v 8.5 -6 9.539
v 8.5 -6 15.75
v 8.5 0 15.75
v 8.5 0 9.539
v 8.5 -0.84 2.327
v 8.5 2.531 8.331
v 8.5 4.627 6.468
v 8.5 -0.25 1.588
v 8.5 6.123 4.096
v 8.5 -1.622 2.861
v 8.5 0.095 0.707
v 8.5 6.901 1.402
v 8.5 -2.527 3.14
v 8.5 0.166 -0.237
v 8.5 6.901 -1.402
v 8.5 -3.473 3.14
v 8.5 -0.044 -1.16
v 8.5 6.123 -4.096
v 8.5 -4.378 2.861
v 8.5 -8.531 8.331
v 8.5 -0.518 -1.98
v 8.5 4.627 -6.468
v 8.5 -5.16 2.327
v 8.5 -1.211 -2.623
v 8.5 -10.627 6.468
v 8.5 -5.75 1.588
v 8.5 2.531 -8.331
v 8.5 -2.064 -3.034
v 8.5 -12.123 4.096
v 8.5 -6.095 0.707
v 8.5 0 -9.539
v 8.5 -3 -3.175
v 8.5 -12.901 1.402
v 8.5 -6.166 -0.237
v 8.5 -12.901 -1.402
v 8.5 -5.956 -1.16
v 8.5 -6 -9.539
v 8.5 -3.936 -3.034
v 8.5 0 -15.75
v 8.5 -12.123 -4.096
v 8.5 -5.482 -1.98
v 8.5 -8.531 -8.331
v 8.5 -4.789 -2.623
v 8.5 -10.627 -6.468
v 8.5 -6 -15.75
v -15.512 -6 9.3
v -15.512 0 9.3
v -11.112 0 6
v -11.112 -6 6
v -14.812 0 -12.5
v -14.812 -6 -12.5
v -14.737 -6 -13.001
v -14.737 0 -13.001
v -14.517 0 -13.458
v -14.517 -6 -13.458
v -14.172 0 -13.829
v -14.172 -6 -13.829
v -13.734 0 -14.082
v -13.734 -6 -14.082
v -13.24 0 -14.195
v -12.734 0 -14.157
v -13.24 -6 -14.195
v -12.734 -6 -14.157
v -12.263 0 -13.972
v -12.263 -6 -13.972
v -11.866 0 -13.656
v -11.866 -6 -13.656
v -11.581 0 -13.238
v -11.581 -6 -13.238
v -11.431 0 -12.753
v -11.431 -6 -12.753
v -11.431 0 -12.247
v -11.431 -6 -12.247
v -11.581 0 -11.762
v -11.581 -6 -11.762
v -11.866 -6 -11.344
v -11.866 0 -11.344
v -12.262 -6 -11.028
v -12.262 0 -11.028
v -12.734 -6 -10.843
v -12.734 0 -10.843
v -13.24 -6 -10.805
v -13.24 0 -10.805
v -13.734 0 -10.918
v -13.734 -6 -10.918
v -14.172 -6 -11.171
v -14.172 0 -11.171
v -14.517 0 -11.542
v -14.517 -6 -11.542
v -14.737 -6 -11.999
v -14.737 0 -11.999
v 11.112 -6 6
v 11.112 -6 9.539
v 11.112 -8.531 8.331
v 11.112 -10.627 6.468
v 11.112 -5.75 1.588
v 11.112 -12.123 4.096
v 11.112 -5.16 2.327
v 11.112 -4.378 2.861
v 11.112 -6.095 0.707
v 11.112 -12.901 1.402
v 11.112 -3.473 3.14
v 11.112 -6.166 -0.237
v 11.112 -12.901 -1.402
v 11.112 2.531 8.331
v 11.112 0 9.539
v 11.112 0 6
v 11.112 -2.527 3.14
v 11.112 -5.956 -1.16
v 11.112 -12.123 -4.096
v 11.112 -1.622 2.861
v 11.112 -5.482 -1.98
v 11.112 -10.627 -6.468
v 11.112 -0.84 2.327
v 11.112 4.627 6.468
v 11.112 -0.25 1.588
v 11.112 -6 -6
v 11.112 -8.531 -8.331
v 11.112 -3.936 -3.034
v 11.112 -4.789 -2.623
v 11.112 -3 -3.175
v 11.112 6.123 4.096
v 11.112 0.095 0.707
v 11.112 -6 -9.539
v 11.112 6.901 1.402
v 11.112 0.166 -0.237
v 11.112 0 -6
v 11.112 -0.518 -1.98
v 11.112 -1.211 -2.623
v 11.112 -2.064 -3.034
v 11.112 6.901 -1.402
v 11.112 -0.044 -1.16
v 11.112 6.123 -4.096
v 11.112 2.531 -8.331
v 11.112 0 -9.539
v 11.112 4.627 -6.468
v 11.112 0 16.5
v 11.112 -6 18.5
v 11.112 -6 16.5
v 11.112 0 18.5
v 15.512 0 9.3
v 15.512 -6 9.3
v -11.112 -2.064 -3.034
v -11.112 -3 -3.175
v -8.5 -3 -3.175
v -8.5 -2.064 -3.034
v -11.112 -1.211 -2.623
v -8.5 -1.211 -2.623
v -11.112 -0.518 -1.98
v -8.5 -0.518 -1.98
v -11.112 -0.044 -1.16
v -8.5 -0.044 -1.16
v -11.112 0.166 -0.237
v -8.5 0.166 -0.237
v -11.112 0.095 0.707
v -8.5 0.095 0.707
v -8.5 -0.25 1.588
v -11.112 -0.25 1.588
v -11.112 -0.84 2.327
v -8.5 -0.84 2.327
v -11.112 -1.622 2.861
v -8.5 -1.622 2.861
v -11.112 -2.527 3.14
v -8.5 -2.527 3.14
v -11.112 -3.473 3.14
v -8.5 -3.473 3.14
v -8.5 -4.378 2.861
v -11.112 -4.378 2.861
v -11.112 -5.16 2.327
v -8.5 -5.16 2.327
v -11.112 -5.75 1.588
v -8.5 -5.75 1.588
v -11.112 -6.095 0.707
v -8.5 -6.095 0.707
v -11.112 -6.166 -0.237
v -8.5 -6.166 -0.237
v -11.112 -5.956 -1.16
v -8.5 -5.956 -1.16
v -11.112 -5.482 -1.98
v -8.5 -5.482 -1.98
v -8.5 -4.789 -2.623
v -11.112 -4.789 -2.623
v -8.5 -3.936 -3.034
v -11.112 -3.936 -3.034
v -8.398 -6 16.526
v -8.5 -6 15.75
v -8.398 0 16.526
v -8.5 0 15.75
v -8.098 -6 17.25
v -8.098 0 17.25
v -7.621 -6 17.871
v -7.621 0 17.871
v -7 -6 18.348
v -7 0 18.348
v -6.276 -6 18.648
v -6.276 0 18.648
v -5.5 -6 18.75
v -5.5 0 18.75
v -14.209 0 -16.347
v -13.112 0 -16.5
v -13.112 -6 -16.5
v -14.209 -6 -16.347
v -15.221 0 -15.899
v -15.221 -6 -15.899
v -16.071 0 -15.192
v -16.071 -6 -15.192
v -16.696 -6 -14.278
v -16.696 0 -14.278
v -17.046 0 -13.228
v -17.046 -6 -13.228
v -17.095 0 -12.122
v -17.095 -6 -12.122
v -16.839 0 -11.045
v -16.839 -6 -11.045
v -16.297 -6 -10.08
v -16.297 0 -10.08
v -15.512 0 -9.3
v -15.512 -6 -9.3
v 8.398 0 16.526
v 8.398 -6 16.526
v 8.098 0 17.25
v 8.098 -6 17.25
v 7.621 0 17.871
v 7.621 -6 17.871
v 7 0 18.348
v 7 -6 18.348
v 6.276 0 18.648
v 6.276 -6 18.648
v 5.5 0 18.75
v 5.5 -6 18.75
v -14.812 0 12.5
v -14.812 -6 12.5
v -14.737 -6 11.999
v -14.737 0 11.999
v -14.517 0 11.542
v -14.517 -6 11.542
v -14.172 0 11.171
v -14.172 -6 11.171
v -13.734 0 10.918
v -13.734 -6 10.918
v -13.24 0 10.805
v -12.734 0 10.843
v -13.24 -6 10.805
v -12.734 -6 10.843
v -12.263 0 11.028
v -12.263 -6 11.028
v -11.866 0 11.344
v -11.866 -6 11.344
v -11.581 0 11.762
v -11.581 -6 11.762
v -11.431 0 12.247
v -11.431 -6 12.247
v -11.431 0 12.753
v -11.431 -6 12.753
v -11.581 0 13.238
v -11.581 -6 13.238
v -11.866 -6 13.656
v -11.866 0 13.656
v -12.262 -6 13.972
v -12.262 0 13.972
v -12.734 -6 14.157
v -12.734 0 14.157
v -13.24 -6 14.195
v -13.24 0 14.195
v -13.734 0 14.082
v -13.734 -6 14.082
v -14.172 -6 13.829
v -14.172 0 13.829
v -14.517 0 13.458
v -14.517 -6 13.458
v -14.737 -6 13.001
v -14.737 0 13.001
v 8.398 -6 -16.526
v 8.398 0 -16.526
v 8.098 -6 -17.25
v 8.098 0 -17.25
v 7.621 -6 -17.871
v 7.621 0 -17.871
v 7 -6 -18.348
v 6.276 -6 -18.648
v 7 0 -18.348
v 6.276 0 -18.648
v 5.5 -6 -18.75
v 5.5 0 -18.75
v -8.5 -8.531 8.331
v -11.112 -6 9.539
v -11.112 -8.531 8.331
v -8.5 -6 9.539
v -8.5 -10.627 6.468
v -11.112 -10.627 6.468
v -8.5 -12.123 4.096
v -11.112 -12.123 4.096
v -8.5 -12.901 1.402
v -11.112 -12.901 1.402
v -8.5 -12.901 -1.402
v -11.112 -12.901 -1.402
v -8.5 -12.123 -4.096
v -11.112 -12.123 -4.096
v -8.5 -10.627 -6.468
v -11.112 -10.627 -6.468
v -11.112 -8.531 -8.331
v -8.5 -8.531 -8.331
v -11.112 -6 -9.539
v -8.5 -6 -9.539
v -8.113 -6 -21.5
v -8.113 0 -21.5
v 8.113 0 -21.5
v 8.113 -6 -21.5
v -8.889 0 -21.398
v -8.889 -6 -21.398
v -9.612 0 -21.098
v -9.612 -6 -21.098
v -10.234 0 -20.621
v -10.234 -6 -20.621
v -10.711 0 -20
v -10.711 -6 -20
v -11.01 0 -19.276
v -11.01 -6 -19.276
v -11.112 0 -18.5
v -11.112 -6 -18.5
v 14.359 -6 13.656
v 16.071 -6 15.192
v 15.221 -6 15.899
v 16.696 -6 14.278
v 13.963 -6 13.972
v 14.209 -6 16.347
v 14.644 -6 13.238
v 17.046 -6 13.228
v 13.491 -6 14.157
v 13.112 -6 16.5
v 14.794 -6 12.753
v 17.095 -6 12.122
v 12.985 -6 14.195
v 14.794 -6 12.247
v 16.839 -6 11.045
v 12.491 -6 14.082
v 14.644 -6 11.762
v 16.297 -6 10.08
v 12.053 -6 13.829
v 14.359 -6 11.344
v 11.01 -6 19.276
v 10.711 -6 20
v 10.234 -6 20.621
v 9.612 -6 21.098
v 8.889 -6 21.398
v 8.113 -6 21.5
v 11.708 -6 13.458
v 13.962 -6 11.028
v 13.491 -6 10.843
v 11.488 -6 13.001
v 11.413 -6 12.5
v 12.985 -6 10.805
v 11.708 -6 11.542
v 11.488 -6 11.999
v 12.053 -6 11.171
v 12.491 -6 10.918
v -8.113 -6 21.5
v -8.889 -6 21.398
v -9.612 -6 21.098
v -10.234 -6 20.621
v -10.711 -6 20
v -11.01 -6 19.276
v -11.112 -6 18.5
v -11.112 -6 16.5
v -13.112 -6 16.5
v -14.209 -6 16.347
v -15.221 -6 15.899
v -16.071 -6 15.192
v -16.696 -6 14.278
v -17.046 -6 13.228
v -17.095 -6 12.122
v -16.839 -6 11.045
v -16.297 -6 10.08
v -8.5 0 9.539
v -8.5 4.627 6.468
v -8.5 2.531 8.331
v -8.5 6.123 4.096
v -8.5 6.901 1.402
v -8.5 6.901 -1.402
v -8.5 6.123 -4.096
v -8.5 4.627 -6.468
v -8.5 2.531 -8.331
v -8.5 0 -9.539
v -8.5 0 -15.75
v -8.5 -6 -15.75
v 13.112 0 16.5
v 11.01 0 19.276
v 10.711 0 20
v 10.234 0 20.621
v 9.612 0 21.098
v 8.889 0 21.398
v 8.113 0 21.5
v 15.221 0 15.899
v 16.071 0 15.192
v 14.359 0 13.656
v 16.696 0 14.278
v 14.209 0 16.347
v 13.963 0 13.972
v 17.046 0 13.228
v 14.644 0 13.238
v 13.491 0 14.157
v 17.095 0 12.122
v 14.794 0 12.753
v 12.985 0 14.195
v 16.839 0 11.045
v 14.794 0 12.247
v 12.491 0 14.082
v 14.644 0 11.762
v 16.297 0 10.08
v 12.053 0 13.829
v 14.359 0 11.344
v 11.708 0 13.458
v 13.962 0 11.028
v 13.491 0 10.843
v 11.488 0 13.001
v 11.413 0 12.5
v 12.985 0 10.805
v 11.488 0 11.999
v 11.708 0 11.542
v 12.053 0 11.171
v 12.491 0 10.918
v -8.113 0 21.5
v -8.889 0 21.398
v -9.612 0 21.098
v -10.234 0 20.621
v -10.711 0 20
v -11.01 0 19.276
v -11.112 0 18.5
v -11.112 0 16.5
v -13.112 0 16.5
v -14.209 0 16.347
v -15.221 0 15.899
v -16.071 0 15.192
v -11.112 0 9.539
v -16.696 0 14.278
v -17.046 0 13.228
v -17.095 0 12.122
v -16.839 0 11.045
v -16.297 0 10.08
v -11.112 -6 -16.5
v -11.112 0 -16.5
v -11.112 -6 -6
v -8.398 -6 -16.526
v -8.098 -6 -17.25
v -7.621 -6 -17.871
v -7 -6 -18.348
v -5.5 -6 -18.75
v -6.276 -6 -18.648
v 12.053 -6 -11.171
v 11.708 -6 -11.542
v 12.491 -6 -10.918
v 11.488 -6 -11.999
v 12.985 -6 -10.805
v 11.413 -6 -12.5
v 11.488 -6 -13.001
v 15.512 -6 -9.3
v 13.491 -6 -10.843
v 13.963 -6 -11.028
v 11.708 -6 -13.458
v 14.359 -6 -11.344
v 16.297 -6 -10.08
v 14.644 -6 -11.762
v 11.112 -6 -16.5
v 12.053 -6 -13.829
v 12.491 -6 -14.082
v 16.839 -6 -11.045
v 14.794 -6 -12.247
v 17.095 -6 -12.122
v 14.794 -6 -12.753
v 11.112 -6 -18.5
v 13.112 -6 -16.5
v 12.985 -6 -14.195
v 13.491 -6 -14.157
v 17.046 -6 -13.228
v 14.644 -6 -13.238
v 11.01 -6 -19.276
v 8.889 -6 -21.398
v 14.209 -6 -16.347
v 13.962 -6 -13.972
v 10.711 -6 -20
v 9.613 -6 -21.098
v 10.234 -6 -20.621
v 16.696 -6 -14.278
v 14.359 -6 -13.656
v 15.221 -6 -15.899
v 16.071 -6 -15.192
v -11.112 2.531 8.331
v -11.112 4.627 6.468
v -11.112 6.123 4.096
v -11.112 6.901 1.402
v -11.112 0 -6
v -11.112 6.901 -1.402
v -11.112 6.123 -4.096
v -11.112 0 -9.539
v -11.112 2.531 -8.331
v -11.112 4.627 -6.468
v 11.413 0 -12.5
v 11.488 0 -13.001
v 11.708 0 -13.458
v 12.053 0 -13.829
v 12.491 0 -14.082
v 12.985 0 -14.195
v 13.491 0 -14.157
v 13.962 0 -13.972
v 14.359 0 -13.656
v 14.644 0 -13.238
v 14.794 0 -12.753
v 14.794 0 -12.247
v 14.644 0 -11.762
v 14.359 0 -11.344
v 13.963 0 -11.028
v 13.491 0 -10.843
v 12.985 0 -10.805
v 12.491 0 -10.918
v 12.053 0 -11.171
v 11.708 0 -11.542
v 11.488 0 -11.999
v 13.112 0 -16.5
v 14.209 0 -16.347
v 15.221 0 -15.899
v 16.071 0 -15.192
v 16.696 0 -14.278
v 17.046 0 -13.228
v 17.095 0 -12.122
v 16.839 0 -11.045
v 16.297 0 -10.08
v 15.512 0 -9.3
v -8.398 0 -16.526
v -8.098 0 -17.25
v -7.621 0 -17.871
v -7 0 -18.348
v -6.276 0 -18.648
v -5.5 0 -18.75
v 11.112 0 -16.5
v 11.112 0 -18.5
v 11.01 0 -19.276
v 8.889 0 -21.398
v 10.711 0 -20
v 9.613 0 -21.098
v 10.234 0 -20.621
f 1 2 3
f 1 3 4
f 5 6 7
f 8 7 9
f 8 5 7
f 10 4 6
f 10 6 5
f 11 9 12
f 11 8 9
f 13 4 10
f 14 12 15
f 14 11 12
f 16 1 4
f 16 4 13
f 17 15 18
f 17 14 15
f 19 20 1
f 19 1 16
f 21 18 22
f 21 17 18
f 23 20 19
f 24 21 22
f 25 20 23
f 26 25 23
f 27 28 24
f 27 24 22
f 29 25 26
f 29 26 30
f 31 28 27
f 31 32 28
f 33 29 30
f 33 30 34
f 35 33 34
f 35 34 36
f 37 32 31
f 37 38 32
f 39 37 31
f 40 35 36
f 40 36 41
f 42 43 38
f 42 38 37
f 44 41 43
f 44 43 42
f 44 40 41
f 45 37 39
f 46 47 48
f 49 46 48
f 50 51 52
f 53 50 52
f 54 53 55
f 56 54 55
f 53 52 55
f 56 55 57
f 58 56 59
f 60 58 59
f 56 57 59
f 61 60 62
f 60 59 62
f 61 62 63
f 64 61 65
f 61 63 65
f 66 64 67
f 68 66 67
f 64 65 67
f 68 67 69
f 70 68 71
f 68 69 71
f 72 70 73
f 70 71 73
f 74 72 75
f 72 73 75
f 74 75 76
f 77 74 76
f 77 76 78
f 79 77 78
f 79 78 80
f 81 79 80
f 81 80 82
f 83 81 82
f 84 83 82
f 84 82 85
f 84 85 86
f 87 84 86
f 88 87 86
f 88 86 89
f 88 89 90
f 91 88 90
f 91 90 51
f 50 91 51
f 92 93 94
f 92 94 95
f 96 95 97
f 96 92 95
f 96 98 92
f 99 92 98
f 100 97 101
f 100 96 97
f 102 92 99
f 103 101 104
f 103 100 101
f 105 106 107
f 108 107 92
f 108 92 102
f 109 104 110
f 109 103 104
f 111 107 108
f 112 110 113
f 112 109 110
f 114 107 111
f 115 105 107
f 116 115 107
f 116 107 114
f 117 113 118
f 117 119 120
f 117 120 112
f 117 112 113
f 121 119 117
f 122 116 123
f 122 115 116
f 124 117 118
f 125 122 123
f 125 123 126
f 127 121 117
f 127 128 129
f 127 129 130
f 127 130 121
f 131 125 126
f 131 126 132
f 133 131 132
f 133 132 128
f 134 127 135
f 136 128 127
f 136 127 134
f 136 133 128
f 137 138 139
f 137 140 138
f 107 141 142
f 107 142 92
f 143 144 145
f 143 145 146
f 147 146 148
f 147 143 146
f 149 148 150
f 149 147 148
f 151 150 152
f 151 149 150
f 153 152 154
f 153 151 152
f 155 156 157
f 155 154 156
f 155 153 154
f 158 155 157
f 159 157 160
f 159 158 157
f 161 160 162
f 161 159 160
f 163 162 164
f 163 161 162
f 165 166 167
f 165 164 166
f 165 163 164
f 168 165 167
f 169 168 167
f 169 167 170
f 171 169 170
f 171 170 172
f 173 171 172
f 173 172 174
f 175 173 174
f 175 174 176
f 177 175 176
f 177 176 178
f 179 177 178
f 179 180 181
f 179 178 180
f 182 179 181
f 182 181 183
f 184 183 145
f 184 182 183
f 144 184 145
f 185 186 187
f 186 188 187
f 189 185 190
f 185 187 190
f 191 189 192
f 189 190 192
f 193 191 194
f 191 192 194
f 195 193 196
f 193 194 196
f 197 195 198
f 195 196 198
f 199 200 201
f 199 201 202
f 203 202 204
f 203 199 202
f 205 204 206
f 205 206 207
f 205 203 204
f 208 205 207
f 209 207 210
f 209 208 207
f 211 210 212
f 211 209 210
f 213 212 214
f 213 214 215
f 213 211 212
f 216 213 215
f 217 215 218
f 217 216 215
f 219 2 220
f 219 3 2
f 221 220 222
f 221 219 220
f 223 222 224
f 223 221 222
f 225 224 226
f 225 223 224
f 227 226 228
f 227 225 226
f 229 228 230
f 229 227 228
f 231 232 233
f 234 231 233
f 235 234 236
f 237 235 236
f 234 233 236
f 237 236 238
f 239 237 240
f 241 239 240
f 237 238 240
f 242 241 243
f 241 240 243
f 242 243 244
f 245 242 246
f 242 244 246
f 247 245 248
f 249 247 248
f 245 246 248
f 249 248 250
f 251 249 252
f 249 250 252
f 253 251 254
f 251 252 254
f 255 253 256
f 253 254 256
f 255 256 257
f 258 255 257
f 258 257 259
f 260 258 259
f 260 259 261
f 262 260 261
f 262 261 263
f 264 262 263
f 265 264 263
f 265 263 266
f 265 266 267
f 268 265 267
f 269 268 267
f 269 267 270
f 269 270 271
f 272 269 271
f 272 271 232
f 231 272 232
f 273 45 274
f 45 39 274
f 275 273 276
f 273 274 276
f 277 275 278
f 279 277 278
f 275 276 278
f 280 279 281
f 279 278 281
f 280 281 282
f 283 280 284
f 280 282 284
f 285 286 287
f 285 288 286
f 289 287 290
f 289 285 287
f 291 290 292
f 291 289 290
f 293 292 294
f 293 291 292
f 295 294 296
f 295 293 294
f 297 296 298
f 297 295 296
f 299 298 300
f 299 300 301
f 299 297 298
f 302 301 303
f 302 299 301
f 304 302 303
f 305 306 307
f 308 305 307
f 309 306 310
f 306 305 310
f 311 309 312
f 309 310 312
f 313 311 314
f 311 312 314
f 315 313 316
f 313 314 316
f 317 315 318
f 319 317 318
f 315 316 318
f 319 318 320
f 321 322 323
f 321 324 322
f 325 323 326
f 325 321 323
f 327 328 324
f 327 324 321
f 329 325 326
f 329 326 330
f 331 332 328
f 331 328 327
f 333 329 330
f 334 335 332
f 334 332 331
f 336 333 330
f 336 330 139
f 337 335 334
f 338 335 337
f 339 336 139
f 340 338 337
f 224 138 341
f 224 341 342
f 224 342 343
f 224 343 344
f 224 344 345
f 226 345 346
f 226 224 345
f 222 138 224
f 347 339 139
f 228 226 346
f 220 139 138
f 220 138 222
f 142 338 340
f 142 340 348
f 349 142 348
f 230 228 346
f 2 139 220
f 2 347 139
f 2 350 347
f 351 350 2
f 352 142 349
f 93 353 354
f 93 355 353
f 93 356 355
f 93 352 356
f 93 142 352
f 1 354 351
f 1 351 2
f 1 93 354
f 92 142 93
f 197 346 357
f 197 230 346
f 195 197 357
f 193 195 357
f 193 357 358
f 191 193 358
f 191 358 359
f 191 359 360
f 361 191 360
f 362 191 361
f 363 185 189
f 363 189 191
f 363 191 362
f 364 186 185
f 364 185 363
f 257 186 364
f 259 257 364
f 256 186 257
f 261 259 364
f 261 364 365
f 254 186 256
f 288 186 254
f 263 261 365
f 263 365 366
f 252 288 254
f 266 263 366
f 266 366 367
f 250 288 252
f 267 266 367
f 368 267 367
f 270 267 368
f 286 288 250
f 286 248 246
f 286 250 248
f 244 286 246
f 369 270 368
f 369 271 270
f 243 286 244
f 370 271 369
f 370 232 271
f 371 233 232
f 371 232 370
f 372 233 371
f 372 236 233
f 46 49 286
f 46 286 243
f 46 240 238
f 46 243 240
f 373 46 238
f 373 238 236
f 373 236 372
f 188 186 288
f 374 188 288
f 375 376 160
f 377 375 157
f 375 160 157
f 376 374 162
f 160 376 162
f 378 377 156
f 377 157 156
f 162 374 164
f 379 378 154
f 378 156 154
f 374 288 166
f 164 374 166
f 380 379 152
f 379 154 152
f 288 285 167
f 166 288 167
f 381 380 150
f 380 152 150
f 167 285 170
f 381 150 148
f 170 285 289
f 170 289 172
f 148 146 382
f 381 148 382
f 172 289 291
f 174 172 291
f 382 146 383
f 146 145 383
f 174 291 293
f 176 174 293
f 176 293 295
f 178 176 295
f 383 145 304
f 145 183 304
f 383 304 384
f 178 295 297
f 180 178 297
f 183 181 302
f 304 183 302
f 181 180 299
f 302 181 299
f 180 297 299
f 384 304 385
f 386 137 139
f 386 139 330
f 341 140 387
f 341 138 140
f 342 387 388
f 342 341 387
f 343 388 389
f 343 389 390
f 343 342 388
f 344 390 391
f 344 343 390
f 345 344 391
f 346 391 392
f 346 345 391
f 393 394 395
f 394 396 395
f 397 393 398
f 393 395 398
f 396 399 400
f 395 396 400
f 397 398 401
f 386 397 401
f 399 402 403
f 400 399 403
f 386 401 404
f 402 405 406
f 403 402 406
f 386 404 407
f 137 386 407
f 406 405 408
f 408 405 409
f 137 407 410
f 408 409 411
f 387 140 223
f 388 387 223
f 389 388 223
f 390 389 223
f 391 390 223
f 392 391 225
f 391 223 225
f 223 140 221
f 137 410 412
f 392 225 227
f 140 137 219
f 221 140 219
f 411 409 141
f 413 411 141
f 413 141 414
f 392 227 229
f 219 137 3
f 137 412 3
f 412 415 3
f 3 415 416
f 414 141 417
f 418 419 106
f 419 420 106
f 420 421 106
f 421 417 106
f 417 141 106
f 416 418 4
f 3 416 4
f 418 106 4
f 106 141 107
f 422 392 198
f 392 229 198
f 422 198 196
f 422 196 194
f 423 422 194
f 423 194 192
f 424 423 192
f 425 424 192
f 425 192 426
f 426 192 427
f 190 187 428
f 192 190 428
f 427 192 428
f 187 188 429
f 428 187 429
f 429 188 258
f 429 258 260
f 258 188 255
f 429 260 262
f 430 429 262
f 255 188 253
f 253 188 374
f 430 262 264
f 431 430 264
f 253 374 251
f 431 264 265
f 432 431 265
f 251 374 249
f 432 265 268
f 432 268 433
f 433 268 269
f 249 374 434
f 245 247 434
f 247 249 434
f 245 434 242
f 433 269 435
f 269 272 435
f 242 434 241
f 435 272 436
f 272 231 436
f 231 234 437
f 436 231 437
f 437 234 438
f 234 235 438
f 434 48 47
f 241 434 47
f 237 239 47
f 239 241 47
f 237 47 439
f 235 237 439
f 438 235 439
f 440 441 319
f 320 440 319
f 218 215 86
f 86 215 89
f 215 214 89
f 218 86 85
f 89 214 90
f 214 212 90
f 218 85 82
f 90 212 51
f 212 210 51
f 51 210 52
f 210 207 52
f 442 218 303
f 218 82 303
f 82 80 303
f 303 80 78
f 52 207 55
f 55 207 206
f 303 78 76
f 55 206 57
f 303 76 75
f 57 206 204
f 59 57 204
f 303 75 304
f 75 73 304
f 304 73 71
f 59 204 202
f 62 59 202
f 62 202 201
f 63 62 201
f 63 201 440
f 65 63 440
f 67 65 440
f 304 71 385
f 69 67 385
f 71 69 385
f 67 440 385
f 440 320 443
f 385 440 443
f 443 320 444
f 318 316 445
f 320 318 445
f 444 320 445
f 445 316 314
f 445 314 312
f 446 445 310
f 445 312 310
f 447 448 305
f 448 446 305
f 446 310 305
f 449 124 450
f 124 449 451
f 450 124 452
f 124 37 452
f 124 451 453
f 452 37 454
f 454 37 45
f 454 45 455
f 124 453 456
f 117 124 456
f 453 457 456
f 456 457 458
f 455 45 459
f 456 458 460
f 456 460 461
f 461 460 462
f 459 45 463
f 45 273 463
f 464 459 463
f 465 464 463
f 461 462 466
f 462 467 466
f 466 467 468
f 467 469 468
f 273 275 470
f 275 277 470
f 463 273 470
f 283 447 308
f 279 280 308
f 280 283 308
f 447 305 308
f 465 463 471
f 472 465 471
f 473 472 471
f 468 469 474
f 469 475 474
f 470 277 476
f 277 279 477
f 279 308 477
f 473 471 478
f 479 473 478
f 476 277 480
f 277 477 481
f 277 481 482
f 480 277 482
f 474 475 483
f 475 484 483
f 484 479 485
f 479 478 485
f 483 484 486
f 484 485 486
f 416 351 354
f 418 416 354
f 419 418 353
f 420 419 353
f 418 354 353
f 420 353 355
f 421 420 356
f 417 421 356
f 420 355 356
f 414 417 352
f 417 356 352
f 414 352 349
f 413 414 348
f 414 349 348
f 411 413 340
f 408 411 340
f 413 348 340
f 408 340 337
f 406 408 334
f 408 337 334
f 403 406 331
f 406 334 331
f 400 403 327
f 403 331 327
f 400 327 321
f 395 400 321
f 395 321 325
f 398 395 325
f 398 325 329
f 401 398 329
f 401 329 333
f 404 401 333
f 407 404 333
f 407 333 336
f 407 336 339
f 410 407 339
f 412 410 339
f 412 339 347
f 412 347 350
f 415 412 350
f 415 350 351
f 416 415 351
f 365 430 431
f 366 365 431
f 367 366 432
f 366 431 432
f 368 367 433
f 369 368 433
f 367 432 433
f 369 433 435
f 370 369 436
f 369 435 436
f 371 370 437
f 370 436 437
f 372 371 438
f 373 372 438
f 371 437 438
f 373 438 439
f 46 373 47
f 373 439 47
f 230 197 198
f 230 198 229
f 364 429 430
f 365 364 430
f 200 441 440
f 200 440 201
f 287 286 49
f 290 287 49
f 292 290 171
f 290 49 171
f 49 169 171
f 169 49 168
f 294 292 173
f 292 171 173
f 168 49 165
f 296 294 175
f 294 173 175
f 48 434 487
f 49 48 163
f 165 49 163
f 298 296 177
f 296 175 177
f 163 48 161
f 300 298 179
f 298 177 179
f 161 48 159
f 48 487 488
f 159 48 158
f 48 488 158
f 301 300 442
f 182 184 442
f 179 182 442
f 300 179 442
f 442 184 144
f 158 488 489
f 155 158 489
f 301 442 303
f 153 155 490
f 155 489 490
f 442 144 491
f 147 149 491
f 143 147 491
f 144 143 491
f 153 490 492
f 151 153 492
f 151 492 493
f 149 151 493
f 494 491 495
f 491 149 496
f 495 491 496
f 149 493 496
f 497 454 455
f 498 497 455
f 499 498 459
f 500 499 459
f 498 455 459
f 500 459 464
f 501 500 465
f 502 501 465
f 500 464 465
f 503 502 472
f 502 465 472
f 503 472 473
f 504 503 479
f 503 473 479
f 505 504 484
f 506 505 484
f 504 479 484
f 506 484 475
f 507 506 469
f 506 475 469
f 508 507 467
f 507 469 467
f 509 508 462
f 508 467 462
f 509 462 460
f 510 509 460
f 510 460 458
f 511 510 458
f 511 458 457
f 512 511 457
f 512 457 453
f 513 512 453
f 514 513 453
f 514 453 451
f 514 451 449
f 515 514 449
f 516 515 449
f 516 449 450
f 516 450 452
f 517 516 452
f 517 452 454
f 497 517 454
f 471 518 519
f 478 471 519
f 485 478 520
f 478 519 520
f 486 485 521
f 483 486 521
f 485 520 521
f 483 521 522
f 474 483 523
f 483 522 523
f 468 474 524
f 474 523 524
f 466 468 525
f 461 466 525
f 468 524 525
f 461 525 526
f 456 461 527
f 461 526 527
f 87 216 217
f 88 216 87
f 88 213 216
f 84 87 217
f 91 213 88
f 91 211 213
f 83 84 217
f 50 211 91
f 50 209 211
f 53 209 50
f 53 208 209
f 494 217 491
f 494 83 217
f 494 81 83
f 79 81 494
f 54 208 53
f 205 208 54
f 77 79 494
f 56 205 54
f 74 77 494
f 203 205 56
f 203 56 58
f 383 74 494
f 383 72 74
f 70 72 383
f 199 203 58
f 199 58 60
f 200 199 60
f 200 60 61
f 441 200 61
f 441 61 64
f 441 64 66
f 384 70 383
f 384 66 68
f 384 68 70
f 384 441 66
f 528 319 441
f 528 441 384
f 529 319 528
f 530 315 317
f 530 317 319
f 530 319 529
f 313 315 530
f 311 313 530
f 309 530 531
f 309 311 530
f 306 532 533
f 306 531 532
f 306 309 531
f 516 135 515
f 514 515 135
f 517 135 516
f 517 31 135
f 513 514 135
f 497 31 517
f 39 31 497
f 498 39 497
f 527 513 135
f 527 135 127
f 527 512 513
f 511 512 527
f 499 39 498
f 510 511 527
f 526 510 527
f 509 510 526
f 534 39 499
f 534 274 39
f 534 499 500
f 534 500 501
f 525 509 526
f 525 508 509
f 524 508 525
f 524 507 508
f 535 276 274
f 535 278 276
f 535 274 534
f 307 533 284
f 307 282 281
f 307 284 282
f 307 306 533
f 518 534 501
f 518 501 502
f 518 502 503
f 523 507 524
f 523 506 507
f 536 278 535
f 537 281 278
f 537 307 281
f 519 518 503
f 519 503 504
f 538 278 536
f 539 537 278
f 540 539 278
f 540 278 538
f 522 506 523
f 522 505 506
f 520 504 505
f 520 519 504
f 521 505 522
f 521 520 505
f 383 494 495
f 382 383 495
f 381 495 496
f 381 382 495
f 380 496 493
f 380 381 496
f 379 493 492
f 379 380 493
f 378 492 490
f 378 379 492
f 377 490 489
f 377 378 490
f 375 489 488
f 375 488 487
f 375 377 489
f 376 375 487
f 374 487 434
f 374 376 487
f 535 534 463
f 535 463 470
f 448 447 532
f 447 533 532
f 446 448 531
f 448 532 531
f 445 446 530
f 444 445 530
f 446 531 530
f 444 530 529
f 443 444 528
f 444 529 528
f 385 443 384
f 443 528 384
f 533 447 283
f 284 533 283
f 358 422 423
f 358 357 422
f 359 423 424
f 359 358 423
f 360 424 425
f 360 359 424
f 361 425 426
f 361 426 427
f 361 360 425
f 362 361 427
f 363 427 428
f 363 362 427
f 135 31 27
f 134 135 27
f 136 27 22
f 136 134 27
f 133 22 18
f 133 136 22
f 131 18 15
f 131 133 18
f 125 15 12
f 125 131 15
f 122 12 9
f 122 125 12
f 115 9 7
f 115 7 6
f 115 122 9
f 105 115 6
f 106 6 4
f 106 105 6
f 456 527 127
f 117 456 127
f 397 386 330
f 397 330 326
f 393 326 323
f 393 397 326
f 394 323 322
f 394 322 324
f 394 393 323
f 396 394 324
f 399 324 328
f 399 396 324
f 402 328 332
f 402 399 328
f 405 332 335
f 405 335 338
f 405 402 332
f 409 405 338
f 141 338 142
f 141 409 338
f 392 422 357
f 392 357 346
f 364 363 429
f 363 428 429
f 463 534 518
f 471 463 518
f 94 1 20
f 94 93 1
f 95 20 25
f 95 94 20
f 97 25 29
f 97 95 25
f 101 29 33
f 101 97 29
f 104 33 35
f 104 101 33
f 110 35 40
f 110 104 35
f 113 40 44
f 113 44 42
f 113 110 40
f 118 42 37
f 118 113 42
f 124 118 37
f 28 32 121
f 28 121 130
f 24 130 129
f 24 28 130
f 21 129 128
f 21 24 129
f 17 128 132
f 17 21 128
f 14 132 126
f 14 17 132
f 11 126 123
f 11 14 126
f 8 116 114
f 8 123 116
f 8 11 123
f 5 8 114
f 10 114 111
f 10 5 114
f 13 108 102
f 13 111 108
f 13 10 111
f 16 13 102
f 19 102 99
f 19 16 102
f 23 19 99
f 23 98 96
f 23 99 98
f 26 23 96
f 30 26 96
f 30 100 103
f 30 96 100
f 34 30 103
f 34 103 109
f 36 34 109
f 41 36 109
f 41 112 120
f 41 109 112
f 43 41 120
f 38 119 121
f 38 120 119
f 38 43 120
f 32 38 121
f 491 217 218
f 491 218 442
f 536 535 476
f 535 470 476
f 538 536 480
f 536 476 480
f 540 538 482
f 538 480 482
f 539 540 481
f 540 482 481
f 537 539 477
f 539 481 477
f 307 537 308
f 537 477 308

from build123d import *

# Parameters (mm, degrees)
SKETCH1_W               = 22.225
SKETCH1_H               = 43
BOSS_EXTRUDE1_DEPTH     = 6
SKETCH3_R               = 10
BOSS_EXTRUDE2_DEPTH     = 22.225
CUT_EXTRUDE1_DEPTH      = 28.47248908
CUT_EXTRUDE1_DEPTH_BACK = 28.47248908
SKETCH4_W               = 17
SKETCH4_H               = 37.5
CUT_EXTRUDE2_DEPTH      = 28.47248908
CUT_EXTRUDE2_DEPTH_BACK = 28.47248908
SKETCH5_R               = 3.175
BOSS_EXTRUDE3_DEPTH     = 6
M3_CLEARANCE_HOLE1_D    = 3.4
FILLET1_R               = 3
FILLET2_R               = 3
BOSS_EXTRUDE4_DEPTH     = 6


with BuildPart() as part:
    # Sketch1 → Boss-Extrude1 (new body)
    with BuildSketch(Plane(origin=(0, 0, 0), x_dir=(1, 0, 0), z_dir=(0, 1, 0))):
        Rectangle(SKETCH1_W, SKETCH1_H)
    extrude(amount=-BOSS_EXTRUDE1_DEPTH)

    # Sketch3 → Boss-Extrude2 (add)
    with BuildSketch(Plane(origin=(11.1125, 0, 0), x_dir=(0, 0, -1), z_dir=(1, 0, 0))):
        with Locations((0, -3)):
            Circle(SKETCH3_R)
    extrude(amount=-BOSS_EXTRUDE2_DEPTH)

    # Sketch4 → Cut-Extrude1 (cut, two sides: drawn at the far end of the back side and taken through both)
    with BuildSketch(Plane(origin=(0, 0, 0), x_dir=(1, 0, 0), z_dir=(0, 1, 0)).offset(-CUT_EXTRUDE1_DEPTH_BACK)):
        Rectangle(SKETCH4_W, SKETCH4_H)
    extrude(amount=CUT_EXTRUDE1_DEPTH + CUT_EXTRUDE1_DEPTH_BACK, mode=Mode.SUBTRACT)

    # Sketch5 → Cut-Extrude2 (cut, two sides: drawn at the far end of the back side and taken through both)
    with BuildSketch(Plane(origin=(0, 0, 0), x_dir=(0, 0, -1), z_dir=(1, 0, 0)).offset(-CUT_EXTRUDE2_DEPTH_BACK)):
        with Locations((0, -3)):
            Circle(SKETCH5_R)
    extrude(amount=CUT_EXTRUDE2_DEPTH + CUT_EXTRUDE2_DEPTH_BACK, mode=Mode.SUBTRACT)

    # Sketch7 → Boss-Extrude3 (add)
    with BuildSketch(Plane(origin=(0, 0, 0), x_dir=(1, 0, 0), z_dir=(0, 1, 0))):
        with BuildLine():
            Line((11.1125, 16.5), (13.1125, 16.5))
            ThreePointArc((13.1125, 16.5), (17.1125, 12.5), (13.1125, 8.5))
            Line((13.1125, 8.5), (11.1125, 8.5))
            Line((11.1125, 8.5), (11.1125, 16.5))
        make_face()
        with BuildLine():
            Line((11.1125, -16.5), (13.1125, -16.5))
            ThreePointArc((13.1125, -16.5), (17.1125, -12.5), (13.1125, -8.5))
            Line((13.1125, -8.5), (11.1125, -8.5))
            Line((11.1125, -8.5), (11.1125, -16.5))
        make_face()
        with BuildLine():
            Line((-11.1125, -8.5), (-11.1125, -16.5))
            Line((-11.1125, -16.5), (-13.1125, -16.5))
            ThreePointArc((-13.1125, -16.5), (-17.1125, -12.5), (-13.1125, -8.5))
            Line((-13.1125, -8.5), (-11.1125, -8.5))
        make_face()
        with BuildLine():
            Line((-11.1125, 8.5), (-11.1125, 16.5))
            Line((-11.1125, 16.5), (-13.1125, 16.5))
            ThreePointArc((-13.1125, 16.5), (-17.1125, 12.5), (-13.1125, 8.5))
            Line((-13.1125, 8.5), (-11.1125, 8.5))
        make_face()
    extrude(amount=-BOSS_EXTRUDE3_DEPTH)

    # M3 Clearance Hole1 (through all)
    with Locations(Plane(origin=(0, 0, 0), x_dir=(1, 0, 0), z_dir=(0, 1, 0))):
        with Locations((13.1125, 12.5), (-13.1125, 12.5), (-13.1125, -12.5), (13.1125, -12.5)):
            Hole(M3_CLEARANCE_HOLE1_D / 2)

    # Fillet1
    fillet1_edges = [part.edges().sort_by_distance(p)[0] for p in [
        (11.1125, -3, 21.5),
        (-11.1125, -3, 21.5),
        (-11.1125, -3, -21.5),
        (11.1125, -3, -21.5),
    ]]
    fillet(fillet1_edges, radius=FILLET1_R)

    # Fillet2
    fillet2_edges = [part.edges().sort_by_distance(p)[0] for p in [
        (-8.5, -3, -18.75),
        (8.5, -3, 18.75),
        (-8.5, -3, 18.75),
        (8.5, -3, -18.75),
    ]]
    fillet(fillet2_edges, radius=FILLET2_R)

    # Sketch11 → Boss-Extrude4 (add)
    with BuildSketch(Plane(origin=(0, 0, 0), x_dir=(1, 0, 0), z_dir=(0, 1, 0))):
        with BuildLine():
            Line((-15.5125, -9.3), (-11.1125, -6))
            Line((-11.1125, -6), (-11.1125, -8.5))
            Line((-11.1125, -8.5), (-13.1125, -8.5))
            ThreePointArc((-13.1125, -8.5), (-14.377411064, -8.705266808), (-15.5125, -9.3))
        make_face()
        with BuildLine():
            Line((-11.1125, 8.5), (-13.1125, 8.5))
            ThreePointArc((-13.1125, 8.5), (-14.377411064, 8.705266808), (-15.5125, 9.3))
            Line((-15.5125, 9.3), (-11.1125, 6))
            Line((-11.1125, 6), (-11.1125, 8.5))
        make_face()
        with BuildLine():
            Line((15.5125, 9.3), (11.1125, 6))
            Line((11.1125, 6), (11.1125, 8.5))
            Line((11.1125, 8.5), (13.1125, 8.5))
            ThreePointArc((13.1125, 8.5), (14.377411064, 8.705266808), (15.5125, 9.3))
        make_face()
        with BuildLine():
            Line((11.1125, -8.5), (13.1125, -8.5))
            ThreePointArc((13.1125, -8.5), (14.377411064, -8.705266808), (15.5125, -9.3))
            Line((15.5125, -9.3), (11.1125, -6))
            Line((11.1125, -6), (11.1125, -8.5))
        make_face()
    extrude(amount=-BOSS_EXTRUDE4_DEPTH)


solid = part.part
